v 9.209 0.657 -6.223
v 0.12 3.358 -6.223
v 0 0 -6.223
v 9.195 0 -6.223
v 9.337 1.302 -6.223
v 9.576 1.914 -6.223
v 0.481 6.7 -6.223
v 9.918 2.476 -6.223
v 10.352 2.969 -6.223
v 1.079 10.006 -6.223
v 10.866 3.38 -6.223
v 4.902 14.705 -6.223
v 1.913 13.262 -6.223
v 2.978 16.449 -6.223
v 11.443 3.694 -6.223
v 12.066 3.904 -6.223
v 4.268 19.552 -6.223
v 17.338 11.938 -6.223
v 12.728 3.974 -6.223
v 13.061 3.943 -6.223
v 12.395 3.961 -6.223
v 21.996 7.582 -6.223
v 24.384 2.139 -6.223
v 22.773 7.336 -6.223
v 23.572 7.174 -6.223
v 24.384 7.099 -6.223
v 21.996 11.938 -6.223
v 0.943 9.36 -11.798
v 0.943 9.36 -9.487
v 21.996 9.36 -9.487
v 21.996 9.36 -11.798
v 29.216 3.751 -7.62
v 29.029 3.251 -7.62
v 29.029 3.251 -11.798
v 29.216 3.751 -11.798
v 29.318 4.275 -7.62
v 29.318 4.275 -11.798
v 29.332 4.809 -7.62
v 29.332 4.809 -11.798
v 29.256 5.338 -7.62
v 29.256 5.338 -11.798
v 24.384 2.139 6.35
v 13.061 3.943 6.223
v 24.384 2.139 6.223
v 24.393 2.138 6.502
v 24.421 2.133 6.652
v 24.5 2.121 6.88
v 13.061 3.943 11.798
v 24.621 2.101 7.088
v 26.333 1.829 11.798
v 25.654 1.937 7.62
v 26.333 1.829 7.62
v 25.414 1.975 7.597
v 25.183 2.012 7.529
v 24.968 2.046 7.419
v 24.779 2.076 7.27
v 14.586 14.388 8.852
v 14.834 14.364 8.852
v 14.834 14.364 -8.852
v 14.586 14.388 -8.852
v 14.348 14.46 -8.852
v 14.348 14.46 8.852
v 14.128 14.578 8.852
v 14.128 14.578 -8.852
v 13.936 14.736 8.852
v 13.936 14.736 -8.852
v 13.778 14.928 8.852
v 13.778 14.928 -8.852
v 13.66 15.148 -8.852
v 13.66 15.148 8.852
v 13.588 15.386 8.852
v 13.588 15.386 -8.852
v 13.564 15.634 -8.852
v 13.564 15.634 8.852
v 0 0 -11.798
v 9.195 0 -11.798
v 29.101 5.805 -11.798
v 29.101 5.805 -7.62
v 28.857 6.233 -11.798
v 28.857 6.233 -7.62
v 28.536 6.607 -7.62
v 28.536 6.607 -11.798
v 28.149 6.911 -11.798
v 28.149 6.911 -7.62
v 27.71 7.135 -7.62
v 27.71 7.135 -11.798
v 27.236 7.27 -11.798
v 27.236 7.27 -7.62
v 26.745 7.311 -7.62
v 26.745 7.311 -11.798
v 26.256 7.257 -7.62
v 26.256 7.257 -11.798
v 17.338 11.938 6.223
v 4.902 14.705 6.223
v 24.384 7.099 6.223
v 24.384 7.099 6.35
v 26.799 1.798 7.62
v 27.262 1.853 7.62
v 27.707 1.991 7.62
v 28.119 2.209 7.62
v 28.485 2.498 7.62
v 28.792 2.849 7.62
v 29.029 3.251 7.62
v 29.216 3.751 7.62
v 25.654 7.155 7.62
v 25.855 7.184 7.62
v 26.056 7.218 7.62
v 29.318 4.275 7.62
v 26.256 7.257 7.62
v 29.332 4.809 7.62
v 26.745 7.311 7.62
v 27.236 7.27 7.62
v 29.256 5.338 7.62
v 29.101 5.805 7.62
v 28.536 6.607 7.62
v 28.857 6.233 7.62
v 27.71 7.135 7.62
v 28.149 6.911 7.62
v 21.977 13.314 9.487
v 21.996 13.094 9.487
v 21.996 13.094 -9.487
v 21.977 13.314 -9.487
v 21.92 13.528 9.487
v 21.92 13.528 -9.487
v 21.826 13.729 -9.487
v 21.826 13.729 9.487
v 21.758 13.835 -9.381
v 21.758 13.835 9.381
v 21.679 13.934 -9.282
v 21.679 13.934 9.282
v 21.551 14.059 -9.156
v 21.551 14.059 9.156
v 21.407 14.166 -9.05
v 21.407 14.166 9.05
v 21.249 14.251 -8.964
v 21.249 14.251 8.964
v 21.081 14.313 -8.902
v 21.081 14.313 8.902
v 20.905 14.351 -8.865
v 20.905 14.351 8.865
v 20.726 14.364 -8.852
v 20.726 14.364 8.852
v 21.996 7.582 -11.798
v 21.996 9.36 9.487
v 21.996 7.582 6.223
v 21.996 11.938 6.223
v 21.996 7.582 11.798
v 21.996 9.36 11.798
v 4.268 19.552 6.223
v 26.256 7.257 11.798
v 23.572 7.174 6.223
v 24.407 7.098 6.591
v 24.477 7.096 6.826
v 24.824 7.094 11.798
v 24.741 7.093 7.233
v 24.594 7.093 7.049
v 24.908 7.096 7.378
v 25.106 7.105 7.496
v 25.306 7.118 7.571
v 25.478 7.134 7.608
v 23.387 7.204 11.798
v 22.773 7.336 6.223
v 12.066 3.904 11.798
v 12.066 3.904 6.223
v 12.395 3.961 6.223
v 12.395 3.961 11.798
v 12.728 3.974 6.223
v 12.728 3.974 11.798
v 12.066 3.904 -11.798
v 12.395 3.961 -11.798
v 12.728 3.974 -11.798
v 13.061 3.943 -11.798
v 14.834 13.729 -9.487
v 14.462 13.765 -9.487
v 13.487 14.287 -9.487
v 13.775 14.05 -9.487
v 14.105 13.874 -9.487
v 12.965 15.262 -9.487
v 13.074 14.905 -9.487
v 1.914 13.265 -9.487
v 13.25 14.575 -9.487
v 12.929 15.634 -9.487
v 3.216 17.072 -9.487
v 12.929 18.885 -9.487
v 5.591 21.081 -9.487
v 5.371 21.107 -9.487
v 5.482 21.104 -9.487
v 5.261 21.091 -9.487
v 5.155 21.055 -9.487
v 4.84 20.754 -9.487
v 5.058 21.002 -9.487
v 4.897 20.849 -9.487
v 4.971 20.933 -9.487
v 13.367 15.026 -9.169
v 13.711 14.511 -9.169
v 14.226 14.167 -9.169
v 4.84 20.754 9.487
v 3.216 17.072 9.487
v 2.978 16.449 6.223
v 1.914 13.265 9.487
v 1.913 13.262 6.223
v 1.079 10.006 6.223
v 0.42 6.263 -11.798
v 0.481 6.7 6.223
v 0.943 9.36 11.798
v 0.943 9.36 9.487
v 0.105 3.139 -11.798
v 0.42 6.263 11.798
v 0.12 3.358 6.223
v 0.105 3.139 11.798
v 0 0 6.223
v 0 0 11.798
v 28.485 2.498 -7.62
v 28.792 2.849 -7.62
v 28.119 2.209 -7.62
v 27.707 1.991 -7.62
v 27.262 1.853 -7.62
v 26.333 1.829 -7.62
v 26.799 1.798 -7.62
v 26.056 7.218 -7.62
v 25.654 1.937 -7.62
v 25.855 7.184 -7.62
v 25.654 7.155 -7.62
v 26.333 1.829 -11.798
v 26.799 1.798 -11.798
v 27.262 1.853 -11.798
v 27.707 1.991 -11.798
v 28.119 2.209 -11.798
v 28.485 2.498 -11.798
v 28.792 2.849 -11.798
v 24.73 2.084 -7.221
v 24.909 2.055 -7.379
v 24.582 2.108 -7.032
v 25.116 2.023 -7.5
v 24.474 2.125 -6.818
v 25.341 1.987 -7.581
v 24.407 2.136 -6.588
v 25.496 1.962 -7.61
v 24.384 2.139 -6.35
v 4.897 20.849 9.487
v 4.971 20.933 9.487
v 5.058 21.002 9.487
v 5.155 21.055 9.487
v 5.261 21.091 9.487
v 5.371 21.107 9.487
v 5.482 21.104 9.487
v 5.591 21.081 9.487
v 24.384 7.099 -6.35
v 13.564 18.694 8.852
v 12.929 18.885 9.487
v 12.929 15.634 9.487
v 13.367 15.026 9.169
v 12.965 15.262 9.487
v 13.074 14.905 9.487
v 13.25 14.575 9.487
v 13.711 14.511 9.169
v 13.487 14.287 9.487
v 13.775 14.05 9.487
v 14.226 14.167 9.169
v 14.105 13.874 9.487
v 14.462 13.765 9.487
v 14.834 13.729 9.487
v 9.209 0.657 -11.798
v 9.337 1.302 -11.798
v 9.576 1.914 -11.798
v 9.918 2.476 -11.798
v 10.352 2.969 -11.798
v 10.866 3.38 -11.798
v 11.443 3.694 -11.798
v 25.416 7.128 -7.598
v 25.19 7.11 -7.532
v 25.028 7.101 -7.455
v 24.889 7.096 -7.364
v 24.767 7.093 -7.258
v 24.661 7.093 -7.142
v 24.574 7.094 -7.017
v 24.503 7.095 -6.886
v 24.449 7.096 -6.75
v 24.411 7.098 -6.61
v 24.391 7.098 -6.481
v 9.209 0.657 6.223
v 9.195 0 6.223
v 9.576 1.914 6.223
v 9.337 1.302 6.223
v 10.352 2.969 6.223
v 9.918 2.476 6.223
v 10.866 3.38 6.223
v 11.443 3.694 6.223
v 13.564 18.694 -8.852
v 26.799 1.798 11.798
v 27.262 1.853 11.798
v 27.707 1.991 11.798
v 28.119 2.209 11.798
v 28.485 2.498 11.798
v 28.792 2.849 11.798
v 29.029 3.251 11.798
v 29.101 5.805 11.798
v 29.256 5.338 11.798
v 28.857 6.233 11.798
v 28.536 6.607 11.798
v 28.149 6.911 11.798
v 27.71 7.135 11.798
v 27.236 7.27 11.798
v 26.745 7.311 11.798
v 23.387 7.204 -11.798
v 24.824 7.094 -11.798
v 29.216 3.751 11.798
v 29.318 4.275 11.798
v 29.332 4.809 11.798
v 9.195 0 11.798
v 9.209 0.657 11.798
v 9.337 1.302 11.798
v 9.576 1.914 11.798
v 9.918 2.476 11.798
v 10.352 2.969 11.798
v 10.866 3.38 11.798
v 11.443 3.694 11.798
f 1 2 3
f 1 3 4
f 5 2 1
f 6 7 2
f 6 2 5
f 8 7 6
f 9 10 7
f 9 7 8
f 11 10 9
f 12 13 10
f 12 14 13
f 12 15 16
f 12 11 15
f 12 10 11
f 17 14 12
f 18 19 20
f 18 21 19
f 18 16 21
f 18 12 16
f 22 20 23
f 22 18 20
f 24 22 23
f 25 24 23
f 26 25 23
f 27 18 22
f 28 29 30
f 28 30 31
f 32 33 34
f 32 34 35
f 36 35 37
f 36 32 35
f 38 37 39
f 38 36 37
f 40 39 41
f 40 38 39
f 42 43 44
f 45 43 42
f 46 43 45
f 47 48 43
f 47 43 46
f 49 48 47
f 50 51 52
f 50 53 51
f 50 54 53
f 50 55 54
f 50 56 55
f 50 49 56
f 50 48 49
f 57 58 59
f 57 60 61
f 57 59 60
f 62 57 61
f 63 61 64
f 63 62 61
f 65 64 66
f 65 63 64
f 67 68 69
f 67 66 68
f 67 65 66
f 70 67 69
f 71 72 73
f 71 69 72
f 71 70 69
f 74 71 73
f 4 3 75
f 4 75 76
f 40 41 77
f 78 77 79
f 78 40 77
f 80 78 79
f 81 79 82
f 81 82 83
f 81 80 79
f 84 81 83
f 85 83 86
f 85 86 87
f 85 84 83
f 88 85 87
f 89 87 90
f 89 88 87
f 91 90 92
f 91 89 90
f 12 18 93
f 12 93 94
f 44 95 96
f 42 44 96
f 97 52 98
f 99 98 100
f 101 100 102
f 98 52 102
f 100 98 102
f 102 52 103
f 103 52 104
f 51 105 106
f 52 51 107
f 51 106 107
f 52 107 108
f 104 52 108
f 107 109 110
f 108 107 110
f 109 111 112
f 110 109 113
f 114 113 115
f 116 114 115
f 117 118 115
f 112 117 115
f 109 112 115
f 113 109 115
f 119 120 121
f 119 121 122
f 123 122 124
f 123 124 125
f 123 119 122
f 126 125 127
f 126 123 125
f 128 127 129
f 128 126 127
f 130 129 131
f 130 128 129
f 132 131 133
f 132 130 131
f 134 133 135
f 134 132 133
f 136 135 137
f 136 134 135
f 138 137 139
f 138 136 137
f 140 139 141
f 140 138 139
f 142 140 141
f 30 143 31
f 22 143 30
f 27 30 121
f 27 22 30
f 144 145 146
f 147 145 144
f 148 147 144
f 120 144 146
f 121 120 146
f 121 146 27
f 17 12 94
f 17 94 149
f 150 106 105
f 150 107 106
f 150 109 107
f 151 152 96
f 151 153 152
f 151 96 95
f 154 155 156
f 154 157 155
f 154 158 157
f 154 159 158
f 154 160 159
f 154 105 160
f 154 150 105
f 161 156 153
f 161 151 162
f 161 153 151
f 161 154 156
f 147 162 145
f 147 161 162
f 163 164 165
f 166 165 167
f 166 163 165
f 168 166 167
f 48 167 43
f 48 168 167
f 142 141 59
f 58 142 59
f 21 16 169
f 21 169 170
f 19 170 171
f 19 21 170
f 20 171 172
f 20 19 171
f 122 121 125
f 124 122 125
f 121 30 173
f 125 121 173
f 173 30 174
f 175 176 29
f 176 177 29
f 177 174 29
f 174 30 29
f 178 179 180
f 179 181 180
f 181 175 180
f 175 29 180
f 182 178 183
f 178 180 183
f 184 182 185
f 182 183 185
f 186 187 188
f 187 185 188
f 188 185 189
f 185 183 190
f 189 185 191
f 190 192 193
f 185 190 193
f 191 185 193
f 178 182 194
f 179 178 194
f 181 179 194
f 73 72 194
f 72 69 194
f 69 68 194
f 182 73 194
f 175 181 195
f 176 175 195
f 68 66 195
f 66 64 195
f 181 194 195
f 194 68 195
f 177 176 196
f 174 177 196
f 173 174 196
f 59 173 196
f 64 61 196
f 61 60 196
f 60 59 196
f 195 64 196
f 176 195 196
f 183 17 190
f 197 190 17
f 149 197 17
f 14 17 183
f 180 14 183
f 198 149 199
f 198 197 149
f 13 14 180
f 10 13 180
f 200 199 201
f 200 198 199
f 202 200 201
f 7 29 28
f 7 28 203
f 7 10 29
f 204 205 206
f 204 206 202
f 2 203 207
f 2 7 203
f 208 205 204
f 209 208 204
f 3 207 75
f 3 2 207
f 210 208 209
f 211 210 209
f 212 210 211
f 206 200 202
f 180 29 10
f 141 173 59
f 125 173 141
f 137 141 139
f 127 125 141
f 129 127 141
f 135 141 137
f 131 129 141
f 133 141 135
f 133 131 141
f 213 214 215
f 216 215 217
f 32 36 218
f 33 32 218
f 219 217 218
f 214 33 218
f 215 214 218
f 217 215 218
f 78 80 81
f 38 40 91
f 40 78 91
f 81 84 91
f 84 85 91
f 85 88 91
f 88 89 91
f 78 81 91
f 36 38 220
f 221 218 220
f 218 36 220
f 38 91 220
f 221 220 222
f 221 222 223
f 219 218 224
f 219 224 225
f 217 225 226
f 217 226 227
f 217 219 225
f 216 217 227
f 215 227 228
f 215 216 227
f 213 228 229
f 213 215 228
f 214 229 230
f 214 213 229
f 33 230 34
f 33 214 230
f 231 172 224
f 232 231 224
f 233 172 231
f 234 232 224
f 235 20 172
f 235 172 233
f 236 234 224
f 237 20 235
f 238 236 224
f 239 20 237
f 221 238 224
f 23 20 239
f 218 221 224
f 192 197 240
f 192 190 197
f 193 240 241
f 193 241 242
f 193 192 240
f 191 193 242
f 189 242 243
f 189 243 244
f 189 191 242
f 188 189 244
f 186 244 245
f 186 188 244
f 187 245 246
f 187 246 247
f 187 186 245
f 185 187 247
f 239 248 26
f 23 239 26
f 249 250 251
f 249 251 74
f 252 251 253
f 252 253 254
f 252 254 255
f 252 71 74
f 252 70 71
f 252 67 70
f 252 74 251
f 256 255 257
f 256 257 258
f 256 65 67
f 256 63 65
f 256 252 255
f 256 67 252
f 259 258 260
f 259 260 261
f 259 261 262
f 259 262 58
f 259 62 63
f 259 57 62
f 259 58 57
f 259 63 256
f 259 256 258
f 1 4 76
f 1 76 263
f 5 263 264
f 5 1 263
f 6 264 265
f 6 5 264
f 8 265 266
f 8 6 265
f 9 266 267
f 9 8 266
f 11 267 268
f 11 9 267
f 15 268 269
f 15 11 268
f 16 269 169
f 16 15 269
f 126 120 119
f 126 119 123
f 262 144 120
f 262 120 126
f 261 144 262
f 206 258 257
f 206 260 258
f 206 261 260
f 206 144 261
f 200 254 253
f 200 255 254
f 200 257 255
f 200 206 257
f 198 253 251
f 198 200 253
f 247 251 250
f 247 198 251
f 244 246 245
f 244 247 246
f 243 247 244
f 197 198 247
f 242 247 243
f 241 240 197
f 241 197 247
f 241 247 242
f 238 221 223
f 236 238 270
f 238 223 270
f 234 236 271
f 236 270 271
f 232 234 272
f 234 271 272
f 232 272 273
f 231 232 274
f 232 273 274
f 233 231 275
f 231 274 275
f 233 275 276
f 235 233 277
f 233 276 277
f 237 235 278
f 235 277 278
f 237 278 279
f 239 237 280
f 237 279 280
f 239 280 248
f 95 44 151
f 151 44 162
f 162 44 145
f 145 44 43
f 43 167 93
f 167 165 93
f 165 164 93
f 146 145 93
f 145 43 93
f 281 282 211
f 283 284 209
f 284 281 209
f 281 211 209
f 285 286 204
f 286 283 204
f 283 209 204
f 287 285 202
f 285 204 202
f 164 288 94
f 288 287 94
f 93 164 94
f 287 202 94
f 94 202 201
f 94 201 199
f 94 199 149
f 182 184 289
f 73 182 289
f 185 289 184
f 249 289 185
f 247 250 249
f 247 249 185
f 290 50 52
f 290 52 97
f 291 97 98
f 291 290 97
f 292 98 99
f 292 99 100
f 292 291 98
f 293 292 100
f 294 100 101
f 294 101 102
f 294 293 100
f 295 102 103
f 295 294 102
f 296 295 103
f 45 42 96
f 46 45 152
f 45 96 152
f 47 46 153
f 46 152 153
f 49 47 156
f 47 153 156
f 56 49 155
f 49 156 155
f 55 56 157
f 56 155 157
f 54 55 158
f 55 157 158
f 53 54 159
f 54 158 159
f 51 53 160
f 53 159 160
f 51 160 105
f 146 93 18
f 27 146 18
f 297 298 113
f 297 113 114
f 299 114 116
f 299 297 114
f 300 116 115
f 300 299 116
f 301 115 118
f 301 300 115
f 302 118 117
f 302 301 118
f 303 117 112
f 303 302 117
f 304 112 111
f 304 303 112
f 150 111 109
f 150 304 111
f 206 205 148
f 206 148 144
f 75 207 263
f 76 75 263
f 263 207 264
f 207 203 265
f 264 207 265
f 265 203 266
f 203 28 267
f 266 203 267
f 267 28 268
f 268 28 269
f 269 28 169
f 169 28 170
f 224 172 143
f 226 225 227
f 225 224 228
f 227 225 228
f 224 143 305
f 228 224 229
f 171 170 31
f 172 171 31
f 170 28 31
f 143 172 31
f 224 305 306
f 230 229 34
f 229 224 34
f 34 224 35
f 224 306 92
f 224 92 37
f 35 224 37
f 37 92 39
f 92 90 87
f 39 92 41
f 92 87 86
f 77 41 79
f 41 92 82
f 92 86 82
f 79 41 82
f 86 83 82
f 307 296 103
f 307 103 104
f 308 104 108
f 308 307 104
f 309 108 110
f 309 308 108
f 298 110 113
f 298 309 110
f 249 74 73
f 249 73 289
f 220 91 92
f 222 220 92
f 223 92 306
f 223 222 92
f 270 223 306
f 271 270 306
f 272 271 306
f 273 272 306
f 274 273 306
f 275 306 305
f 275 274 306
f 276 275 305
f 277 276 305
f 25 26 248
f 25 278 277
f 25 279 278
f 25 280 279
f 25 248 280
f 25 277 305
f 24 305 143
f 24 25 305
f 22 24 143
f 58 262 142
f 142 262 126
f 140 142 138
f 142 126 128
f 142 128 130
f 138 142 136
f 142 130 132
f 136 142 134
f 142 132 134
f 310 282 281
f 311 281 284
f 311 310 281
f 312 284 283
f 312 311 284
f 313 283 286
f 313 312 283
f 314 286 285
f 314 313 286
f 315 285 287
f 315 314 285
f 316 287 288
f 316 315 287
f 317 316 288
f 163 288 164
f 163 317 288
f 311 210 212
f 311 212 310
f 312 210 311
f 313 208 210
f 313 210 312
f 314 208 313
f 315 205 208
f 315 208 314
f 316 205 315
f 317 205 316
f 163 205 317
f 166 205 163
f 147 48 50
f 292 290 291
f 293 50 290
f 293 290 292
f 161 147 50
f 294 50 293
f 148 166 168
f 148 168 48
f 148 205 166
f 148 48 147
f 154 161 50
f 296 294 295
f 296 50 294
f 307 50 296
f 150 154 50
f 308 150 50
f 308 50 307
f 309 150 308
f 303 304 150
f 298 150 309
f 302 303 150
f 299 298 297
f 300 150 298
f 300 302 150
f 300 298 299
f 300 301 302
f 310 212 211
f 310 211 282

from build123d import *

# Parameters (mm, degrees)
BOSS_EXTRUDE1_DEPTH = 11.7983
SKETCH2_W           = 2.782556626
SKETCH2_H           = 16.695339754
CUT_EXTRUDE1_DEPTH  = 39.088832947
CHAMFER5_SIZE       = 0.635
FILLET1_R           = 0.635
SKETCH3_W           = 12.446
SKETCH3_H           = 11.938
CUT_EXTRUDE2_DEPTH  = 23.5966
CUT_EXTRUDE3_DEPTH  = 23.5966
CUT_EXTRUDE4_DEPTH  = 12.446


with BuildPart() as part:
    # Sketch1 → Boss-Extrude1 (new, symmetric)
    with BuildSketch(Plane.XY):
        with BuildLine():
            Line((0, 0), (9.1948, 0))
            ThreePointArc((9.1948, 0), (9.917795425, 2.47592173), (12.065820738, 3.903821604))
            ThreePointArc((12.065820738, 3.903821604), (12.561454562, 3.97266008), (13.060965958, 3.942995467))
            Line((13.060965958, 3.942995467), (26.333208305, 1.828629586))
            ThreePointArc((26.333208305, 1.828629586), (27.918052264, 2.09049066), (29.028861508, 3.25083734))
            ThreePointArc((29.028861508, 3.25083734), (29.318103156, 4.275095808), (29.256355961, 5.337618007))
            ThreePointArc((29.256355961, 5.337618007), (28.148880761, 6.911407154), (26.255762963, 7.25697712))
            ThreePointArc((26.255762963, 7.25697712), (24.102846991, 7.114861278), (21.9964, 7.5819))
            Line((21.9964, 7.5819), (21.9964, 13.0937))
            ThreePointArc((21.9964, 13.0937), (21.624425612, 13.991725612), (20.7264, 14.3637))
            Line((20.7264, 14.3637), (14.8336, 14.3637))
            ThreePointArc((14.8336, 14.3637), (13.935574388, 14.735674388), (13.5636, 15.6337))
            Line((13.5636, 15.6337), (13.5636, 18.6944))
            Line((13.5636, 18.6944), (5.08, 21.2344))
            ThreePointArc((5.08, 21.2344), (1.287669396, 10.916800623), (0, 0))
        make_face()
    extrude(amount=BOSS_EXTRUDE1_DEPTH, both=True)

    # Sketch2 → Cut-Extrude1 (cut, through all)
    with BuildSketch(Plane(origin=(0, 0, 0), x_dir=(0, 0, -1), z_dir=(1, 0, 0))):
        with Locations((-10.878178313, 17.707569877)):
            Rectangle(SKETCH2_W, SKETCH2_H)
        with Locations((10.878178313, 17.707569877)):
            Rectangle(SKETCH2_W, SKETCH2_H)
    extrude(amount=CUT_EXTRUDE1_DEPTH, mode=Mode.SUBTRACT)

    # Chamfer5
    # the kernel refuses this chamfer: 0.635 mm, written as the material it takes off along each edge
    with BuildSketch(Plane(origin=(22.359418697, 14.3637, 9.4869), x_dir=(0, -0.9996219169112966, 0.02749587661058734), z_dir=(-1, 0, 0))) as chamfer5_piece_1:
        Polygon((CHAMFER5_SIZE * 0.999621916911, -CHAMFER5_SIZE * 0.0274958766106), (-CHAMFER5_SIZE * 0.0274958766106, -CHAMFER5_SIZE * 0.999621916911), (0, 0), align=None)
    extrude(amount=7.525818697, mode=Mode.SUBTRACT)
    with BuildSketch(Plane(origin=(14.8336, 15.6337, 9.4869), x_dir=(-1, 0, 0), z_dir=(0, 1, 0))) as chamfer5_piece_2:
        Polygon((1.27 + CHAMFER5_SIZE, 0), (1.27, -CHAMFER5_SIZE), (1.27, 0), align=None)
    revolve(axis=Axis((14.8336, 15.6337, 9.4869), (0, 0, 1)), revolution_arc=90, mode=Mode.SUBTRACT)
    with BuildSketch(Plane(origin=(13.5636, 15.6337, 9.4869), x_dir=(-0.9996219169112968, 0, 0.02749587661058727), z_dir=(0, 1, 0))) as chamfer5_piece_3:
        Polygon((CHAMFER5_SIZE * 0.999621916911, -CHAMFER5_SIZE * 0.0274958766106), (-CHAMFER5_SIZE * 0.0274958766106, -CHAMFER5_SIZE * 0.999621916911), (0, 0), align=None)
    extrude(amount=4.693718697, mode=Mode.SUBTRACT)
    with BuildSketch(Plane(origin=(13.5636, 15.6337, -9.4869), x_dir=(-0.9996219169112968, 0, -0.02749587661058727), z_dir=(0, 1, 0))) as chamfer5_piece_4:
        Polygon((CHAMFER5_SIZE * 0.999621916911, CHAMFER5_SIZE * 0.0274958766106), (-CHAMFER5_SIZE * 0.0274958766106, CHAMFER5_SIZE * 0.999621916911), (0, 0), align=None)
    extrude(amount=4.693718697, mode=Mode.SUBTRACT)
    with BuildSketch(Plane(origin=(14.8336, 15.6337, -9.4869), x_dir=(-1, 0, 0), z_dir=(0, 1, 0))) as chamfer5_piece_5:
        Polygon((1.27 + CHAMFER5_SIZE, 0), (1.27, CHAMFER5_SIZE), (1.27, 0), align=None)
    revolve(axis=Axis((14.8336, 15.6337, -9.4869), (0, 0, 1)), revolution_arc=90, mode=Mode.SUBTRACT)
    with BuildSketch(Plane(origin=(22.359418697, 14.3637, -9.4869), x_dir=(0, -0.9996219169112968, -0.027495876610587194), z_dir=(-1, 0, 0))) as chamfer5_piece_6:
        Polygon((CHAMFER5_SIZE * 0.999621916911, CHAMFER5_SIZE * 0.0274958766106), (-CHAMFER5_SIZE * 0.0274958766106, CHAMFER5_SIZE * 0.999621916911), (0, 0), align=None)
    extrude(amount=7.525818697, mode=Mode.SUBTRACT)

    # Fillet1
    fillet1_edges = [part.edges().sort_by_distance(p)[0] for p in [
        (5.08, 21.2344, 0),
    ]]
    fillet(fillet1_edges, radius=FILLET1_R)

    # Sketch3 → Cut-Extrude2 (cut)
    with BuildSketch(Plane(origin=(0, 0, 0), x_dir=(0, 0, -1), z_dir=(1, 0, 0))):
        with Locations((0, 5.969)):
            Rectangle(SKETCH3_W, SKETCH3_H)
    extrude(amount=CUT_EXTRUDE2_DEPTH, mode=Mode.SUBTRACT)

    # Sketch4 → Cut-Extrude3 (cut)
    with BuildSketch(Plane(origin=(0, 11.938, 0), x_dir=(-1, 0, 0), z_dir=(0, -1, 0))):
        with BuildLine():
            Line((-18.943995478, -6.223), (-24.384, -6.223))
            Line((-24.384, -6.223), (-24.384, -6.35))
            ThreePointArc((-24.384, -6.35), (-24.755974388, -7.248025612), (-25.654, -7.62))
            Line((-25.654, -7.62), (-29.337, -7.62))
            Line((-29.337, -7.62), (-29.337, 7.62))
            Line((-29.337, 7.62), (-25.654, 7.62))
            ThreePointArc((-25.654, 7.62), (-24.755974388, 7.248025612), (-24.384, 6.35))
            Line((-24.384, 6.35), (-24.384, 6.223))
            Line((-24.384, 6.223), (-18.943995478, 6.223))
            Line((-18.943995478, 6.223), (-18.943995478, -6.223))
        make_face()
    extrude(amount=CUT_EXTRUDE3_DEPTH, mode=Mode.SUBTRACT)

    # Sketch5 → Cut-Extrude4 (cut)
    with BuildSketch(Plane.XY.offset(-6.223)):
        Polygon((17.373606876, 11.930026708), (4.9022, 14.705176479), (4.267958712, 19.552209242), (1.539127618, 19.552209242), (1.539127618, 11.930026708), align=None)
    extrude(amount=CUT_EXTRUDE4_DEPTH, mode=Mode.SUBTRACT)


solid = part.part
